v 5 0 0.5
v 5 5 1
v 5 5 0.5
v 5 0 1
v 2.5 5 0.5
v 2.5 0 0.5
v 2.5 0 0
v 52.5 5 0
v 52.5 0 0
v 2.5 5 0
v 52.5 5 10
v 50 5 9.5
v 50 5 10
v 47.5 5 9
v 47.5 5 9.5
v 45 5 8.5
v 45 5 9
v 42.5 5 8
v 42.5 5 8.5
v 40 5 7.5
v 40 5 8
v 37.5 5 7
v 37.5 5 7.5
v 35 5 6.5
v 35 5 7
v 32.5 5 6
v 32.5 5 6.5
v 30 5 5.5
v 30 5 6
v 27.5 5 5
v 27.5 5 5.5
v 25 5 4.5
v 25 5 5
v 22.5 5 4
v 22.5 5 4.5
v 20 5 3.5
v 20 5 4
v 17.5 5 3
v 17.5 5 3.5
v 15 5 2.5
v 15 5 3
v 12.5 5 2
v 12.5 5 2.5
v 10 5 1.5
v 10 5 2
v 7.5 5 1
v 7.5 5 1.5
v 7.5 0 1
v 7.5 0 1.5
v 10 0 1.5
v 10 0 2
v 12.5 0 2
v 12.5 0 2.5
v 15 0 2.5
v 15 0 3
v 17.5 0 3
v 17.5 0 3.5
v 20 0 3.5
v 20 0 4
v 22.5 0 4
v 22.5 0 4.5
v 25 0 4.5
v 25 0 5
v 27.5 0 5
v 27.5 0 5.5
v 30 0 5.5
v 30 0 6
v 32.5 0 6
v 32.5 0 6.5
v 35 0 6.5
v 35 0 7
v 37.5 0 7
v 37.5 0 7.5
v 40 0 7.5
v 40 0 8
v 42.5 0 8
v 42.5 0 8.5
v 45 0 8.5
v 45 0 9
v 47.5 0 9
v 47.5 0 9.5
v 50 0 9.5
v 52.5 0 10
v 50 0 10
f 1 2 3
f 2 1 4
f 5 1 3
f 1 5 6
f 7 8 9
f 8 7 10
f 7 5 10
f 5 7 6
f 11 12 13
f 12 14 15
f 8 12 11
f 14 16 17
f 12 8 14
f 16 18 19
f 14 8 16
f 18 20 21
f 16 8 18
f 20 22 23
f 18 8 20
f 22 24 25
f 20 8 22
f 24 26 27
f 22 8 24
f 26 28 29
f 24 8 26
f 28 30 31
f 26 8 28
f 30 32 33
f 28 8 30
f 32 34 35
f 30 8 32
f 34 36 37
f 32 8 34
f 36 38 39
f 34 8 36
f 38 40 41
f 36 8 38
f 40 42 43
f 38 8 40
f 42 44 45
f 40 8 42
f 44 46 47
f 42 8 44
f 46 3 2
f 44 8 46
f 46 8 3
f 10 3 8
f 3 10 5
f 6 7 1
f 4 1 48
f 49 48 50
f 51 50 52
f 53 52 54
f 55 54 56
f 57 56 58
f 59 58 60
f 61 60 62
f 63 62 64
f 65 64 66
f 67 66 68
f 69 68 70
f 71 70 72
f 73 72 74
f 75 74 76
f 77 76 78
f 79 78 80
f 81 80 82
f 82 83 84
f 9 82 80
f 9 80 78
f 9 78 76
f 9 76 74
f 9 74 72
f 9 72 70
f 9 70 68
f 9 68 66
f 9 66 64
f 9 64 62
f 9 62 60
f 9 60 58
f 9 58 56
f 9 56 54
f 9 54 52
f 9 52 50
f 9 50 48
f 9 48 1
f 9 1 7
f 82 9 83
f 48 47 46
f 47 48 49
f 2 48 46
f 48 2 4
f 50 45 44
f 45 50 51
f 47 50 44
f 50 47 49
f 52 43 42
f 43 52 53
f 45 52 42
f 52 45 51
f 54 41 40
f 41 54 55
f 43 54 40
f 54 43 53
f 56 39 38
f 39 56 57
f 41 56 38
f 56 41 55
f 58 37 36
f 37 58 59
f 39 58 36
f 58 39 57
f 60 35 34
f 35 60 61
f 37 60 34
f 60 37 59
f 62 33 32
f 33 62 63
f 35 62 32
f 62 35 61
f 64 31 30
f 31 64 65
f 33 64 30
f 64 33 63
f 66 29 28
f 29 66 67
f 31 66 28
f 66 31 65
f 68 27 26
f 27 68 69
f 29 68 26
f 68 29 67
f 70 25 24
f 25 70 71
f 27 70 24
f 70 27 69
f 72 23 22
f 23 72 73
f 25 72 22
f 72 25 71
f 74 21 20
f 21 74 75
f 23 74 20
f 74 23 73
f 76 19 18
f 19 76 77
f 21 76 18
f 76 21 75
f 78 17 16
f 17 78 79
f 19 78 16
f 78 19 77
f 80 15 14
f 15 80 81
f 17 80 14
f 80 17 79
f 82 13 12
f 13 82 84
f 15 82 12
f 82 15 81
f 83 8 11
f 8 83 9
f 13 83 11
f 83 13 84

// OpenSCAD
// A stair shaped tool with small steps to messure height of the chassi from the ground.
// Can be used as droop messure also
// The stick is 1mm high per 1cm length with 0.5mm steps

width = 5;
step_width = 2.5;
step_height = 0.5;
steps = 20;

for ( i = [0 : steps]  )  {
    translate([step_width*i, 0, 0])
    cube([step_width,width,step_height*i], center = false);
}
